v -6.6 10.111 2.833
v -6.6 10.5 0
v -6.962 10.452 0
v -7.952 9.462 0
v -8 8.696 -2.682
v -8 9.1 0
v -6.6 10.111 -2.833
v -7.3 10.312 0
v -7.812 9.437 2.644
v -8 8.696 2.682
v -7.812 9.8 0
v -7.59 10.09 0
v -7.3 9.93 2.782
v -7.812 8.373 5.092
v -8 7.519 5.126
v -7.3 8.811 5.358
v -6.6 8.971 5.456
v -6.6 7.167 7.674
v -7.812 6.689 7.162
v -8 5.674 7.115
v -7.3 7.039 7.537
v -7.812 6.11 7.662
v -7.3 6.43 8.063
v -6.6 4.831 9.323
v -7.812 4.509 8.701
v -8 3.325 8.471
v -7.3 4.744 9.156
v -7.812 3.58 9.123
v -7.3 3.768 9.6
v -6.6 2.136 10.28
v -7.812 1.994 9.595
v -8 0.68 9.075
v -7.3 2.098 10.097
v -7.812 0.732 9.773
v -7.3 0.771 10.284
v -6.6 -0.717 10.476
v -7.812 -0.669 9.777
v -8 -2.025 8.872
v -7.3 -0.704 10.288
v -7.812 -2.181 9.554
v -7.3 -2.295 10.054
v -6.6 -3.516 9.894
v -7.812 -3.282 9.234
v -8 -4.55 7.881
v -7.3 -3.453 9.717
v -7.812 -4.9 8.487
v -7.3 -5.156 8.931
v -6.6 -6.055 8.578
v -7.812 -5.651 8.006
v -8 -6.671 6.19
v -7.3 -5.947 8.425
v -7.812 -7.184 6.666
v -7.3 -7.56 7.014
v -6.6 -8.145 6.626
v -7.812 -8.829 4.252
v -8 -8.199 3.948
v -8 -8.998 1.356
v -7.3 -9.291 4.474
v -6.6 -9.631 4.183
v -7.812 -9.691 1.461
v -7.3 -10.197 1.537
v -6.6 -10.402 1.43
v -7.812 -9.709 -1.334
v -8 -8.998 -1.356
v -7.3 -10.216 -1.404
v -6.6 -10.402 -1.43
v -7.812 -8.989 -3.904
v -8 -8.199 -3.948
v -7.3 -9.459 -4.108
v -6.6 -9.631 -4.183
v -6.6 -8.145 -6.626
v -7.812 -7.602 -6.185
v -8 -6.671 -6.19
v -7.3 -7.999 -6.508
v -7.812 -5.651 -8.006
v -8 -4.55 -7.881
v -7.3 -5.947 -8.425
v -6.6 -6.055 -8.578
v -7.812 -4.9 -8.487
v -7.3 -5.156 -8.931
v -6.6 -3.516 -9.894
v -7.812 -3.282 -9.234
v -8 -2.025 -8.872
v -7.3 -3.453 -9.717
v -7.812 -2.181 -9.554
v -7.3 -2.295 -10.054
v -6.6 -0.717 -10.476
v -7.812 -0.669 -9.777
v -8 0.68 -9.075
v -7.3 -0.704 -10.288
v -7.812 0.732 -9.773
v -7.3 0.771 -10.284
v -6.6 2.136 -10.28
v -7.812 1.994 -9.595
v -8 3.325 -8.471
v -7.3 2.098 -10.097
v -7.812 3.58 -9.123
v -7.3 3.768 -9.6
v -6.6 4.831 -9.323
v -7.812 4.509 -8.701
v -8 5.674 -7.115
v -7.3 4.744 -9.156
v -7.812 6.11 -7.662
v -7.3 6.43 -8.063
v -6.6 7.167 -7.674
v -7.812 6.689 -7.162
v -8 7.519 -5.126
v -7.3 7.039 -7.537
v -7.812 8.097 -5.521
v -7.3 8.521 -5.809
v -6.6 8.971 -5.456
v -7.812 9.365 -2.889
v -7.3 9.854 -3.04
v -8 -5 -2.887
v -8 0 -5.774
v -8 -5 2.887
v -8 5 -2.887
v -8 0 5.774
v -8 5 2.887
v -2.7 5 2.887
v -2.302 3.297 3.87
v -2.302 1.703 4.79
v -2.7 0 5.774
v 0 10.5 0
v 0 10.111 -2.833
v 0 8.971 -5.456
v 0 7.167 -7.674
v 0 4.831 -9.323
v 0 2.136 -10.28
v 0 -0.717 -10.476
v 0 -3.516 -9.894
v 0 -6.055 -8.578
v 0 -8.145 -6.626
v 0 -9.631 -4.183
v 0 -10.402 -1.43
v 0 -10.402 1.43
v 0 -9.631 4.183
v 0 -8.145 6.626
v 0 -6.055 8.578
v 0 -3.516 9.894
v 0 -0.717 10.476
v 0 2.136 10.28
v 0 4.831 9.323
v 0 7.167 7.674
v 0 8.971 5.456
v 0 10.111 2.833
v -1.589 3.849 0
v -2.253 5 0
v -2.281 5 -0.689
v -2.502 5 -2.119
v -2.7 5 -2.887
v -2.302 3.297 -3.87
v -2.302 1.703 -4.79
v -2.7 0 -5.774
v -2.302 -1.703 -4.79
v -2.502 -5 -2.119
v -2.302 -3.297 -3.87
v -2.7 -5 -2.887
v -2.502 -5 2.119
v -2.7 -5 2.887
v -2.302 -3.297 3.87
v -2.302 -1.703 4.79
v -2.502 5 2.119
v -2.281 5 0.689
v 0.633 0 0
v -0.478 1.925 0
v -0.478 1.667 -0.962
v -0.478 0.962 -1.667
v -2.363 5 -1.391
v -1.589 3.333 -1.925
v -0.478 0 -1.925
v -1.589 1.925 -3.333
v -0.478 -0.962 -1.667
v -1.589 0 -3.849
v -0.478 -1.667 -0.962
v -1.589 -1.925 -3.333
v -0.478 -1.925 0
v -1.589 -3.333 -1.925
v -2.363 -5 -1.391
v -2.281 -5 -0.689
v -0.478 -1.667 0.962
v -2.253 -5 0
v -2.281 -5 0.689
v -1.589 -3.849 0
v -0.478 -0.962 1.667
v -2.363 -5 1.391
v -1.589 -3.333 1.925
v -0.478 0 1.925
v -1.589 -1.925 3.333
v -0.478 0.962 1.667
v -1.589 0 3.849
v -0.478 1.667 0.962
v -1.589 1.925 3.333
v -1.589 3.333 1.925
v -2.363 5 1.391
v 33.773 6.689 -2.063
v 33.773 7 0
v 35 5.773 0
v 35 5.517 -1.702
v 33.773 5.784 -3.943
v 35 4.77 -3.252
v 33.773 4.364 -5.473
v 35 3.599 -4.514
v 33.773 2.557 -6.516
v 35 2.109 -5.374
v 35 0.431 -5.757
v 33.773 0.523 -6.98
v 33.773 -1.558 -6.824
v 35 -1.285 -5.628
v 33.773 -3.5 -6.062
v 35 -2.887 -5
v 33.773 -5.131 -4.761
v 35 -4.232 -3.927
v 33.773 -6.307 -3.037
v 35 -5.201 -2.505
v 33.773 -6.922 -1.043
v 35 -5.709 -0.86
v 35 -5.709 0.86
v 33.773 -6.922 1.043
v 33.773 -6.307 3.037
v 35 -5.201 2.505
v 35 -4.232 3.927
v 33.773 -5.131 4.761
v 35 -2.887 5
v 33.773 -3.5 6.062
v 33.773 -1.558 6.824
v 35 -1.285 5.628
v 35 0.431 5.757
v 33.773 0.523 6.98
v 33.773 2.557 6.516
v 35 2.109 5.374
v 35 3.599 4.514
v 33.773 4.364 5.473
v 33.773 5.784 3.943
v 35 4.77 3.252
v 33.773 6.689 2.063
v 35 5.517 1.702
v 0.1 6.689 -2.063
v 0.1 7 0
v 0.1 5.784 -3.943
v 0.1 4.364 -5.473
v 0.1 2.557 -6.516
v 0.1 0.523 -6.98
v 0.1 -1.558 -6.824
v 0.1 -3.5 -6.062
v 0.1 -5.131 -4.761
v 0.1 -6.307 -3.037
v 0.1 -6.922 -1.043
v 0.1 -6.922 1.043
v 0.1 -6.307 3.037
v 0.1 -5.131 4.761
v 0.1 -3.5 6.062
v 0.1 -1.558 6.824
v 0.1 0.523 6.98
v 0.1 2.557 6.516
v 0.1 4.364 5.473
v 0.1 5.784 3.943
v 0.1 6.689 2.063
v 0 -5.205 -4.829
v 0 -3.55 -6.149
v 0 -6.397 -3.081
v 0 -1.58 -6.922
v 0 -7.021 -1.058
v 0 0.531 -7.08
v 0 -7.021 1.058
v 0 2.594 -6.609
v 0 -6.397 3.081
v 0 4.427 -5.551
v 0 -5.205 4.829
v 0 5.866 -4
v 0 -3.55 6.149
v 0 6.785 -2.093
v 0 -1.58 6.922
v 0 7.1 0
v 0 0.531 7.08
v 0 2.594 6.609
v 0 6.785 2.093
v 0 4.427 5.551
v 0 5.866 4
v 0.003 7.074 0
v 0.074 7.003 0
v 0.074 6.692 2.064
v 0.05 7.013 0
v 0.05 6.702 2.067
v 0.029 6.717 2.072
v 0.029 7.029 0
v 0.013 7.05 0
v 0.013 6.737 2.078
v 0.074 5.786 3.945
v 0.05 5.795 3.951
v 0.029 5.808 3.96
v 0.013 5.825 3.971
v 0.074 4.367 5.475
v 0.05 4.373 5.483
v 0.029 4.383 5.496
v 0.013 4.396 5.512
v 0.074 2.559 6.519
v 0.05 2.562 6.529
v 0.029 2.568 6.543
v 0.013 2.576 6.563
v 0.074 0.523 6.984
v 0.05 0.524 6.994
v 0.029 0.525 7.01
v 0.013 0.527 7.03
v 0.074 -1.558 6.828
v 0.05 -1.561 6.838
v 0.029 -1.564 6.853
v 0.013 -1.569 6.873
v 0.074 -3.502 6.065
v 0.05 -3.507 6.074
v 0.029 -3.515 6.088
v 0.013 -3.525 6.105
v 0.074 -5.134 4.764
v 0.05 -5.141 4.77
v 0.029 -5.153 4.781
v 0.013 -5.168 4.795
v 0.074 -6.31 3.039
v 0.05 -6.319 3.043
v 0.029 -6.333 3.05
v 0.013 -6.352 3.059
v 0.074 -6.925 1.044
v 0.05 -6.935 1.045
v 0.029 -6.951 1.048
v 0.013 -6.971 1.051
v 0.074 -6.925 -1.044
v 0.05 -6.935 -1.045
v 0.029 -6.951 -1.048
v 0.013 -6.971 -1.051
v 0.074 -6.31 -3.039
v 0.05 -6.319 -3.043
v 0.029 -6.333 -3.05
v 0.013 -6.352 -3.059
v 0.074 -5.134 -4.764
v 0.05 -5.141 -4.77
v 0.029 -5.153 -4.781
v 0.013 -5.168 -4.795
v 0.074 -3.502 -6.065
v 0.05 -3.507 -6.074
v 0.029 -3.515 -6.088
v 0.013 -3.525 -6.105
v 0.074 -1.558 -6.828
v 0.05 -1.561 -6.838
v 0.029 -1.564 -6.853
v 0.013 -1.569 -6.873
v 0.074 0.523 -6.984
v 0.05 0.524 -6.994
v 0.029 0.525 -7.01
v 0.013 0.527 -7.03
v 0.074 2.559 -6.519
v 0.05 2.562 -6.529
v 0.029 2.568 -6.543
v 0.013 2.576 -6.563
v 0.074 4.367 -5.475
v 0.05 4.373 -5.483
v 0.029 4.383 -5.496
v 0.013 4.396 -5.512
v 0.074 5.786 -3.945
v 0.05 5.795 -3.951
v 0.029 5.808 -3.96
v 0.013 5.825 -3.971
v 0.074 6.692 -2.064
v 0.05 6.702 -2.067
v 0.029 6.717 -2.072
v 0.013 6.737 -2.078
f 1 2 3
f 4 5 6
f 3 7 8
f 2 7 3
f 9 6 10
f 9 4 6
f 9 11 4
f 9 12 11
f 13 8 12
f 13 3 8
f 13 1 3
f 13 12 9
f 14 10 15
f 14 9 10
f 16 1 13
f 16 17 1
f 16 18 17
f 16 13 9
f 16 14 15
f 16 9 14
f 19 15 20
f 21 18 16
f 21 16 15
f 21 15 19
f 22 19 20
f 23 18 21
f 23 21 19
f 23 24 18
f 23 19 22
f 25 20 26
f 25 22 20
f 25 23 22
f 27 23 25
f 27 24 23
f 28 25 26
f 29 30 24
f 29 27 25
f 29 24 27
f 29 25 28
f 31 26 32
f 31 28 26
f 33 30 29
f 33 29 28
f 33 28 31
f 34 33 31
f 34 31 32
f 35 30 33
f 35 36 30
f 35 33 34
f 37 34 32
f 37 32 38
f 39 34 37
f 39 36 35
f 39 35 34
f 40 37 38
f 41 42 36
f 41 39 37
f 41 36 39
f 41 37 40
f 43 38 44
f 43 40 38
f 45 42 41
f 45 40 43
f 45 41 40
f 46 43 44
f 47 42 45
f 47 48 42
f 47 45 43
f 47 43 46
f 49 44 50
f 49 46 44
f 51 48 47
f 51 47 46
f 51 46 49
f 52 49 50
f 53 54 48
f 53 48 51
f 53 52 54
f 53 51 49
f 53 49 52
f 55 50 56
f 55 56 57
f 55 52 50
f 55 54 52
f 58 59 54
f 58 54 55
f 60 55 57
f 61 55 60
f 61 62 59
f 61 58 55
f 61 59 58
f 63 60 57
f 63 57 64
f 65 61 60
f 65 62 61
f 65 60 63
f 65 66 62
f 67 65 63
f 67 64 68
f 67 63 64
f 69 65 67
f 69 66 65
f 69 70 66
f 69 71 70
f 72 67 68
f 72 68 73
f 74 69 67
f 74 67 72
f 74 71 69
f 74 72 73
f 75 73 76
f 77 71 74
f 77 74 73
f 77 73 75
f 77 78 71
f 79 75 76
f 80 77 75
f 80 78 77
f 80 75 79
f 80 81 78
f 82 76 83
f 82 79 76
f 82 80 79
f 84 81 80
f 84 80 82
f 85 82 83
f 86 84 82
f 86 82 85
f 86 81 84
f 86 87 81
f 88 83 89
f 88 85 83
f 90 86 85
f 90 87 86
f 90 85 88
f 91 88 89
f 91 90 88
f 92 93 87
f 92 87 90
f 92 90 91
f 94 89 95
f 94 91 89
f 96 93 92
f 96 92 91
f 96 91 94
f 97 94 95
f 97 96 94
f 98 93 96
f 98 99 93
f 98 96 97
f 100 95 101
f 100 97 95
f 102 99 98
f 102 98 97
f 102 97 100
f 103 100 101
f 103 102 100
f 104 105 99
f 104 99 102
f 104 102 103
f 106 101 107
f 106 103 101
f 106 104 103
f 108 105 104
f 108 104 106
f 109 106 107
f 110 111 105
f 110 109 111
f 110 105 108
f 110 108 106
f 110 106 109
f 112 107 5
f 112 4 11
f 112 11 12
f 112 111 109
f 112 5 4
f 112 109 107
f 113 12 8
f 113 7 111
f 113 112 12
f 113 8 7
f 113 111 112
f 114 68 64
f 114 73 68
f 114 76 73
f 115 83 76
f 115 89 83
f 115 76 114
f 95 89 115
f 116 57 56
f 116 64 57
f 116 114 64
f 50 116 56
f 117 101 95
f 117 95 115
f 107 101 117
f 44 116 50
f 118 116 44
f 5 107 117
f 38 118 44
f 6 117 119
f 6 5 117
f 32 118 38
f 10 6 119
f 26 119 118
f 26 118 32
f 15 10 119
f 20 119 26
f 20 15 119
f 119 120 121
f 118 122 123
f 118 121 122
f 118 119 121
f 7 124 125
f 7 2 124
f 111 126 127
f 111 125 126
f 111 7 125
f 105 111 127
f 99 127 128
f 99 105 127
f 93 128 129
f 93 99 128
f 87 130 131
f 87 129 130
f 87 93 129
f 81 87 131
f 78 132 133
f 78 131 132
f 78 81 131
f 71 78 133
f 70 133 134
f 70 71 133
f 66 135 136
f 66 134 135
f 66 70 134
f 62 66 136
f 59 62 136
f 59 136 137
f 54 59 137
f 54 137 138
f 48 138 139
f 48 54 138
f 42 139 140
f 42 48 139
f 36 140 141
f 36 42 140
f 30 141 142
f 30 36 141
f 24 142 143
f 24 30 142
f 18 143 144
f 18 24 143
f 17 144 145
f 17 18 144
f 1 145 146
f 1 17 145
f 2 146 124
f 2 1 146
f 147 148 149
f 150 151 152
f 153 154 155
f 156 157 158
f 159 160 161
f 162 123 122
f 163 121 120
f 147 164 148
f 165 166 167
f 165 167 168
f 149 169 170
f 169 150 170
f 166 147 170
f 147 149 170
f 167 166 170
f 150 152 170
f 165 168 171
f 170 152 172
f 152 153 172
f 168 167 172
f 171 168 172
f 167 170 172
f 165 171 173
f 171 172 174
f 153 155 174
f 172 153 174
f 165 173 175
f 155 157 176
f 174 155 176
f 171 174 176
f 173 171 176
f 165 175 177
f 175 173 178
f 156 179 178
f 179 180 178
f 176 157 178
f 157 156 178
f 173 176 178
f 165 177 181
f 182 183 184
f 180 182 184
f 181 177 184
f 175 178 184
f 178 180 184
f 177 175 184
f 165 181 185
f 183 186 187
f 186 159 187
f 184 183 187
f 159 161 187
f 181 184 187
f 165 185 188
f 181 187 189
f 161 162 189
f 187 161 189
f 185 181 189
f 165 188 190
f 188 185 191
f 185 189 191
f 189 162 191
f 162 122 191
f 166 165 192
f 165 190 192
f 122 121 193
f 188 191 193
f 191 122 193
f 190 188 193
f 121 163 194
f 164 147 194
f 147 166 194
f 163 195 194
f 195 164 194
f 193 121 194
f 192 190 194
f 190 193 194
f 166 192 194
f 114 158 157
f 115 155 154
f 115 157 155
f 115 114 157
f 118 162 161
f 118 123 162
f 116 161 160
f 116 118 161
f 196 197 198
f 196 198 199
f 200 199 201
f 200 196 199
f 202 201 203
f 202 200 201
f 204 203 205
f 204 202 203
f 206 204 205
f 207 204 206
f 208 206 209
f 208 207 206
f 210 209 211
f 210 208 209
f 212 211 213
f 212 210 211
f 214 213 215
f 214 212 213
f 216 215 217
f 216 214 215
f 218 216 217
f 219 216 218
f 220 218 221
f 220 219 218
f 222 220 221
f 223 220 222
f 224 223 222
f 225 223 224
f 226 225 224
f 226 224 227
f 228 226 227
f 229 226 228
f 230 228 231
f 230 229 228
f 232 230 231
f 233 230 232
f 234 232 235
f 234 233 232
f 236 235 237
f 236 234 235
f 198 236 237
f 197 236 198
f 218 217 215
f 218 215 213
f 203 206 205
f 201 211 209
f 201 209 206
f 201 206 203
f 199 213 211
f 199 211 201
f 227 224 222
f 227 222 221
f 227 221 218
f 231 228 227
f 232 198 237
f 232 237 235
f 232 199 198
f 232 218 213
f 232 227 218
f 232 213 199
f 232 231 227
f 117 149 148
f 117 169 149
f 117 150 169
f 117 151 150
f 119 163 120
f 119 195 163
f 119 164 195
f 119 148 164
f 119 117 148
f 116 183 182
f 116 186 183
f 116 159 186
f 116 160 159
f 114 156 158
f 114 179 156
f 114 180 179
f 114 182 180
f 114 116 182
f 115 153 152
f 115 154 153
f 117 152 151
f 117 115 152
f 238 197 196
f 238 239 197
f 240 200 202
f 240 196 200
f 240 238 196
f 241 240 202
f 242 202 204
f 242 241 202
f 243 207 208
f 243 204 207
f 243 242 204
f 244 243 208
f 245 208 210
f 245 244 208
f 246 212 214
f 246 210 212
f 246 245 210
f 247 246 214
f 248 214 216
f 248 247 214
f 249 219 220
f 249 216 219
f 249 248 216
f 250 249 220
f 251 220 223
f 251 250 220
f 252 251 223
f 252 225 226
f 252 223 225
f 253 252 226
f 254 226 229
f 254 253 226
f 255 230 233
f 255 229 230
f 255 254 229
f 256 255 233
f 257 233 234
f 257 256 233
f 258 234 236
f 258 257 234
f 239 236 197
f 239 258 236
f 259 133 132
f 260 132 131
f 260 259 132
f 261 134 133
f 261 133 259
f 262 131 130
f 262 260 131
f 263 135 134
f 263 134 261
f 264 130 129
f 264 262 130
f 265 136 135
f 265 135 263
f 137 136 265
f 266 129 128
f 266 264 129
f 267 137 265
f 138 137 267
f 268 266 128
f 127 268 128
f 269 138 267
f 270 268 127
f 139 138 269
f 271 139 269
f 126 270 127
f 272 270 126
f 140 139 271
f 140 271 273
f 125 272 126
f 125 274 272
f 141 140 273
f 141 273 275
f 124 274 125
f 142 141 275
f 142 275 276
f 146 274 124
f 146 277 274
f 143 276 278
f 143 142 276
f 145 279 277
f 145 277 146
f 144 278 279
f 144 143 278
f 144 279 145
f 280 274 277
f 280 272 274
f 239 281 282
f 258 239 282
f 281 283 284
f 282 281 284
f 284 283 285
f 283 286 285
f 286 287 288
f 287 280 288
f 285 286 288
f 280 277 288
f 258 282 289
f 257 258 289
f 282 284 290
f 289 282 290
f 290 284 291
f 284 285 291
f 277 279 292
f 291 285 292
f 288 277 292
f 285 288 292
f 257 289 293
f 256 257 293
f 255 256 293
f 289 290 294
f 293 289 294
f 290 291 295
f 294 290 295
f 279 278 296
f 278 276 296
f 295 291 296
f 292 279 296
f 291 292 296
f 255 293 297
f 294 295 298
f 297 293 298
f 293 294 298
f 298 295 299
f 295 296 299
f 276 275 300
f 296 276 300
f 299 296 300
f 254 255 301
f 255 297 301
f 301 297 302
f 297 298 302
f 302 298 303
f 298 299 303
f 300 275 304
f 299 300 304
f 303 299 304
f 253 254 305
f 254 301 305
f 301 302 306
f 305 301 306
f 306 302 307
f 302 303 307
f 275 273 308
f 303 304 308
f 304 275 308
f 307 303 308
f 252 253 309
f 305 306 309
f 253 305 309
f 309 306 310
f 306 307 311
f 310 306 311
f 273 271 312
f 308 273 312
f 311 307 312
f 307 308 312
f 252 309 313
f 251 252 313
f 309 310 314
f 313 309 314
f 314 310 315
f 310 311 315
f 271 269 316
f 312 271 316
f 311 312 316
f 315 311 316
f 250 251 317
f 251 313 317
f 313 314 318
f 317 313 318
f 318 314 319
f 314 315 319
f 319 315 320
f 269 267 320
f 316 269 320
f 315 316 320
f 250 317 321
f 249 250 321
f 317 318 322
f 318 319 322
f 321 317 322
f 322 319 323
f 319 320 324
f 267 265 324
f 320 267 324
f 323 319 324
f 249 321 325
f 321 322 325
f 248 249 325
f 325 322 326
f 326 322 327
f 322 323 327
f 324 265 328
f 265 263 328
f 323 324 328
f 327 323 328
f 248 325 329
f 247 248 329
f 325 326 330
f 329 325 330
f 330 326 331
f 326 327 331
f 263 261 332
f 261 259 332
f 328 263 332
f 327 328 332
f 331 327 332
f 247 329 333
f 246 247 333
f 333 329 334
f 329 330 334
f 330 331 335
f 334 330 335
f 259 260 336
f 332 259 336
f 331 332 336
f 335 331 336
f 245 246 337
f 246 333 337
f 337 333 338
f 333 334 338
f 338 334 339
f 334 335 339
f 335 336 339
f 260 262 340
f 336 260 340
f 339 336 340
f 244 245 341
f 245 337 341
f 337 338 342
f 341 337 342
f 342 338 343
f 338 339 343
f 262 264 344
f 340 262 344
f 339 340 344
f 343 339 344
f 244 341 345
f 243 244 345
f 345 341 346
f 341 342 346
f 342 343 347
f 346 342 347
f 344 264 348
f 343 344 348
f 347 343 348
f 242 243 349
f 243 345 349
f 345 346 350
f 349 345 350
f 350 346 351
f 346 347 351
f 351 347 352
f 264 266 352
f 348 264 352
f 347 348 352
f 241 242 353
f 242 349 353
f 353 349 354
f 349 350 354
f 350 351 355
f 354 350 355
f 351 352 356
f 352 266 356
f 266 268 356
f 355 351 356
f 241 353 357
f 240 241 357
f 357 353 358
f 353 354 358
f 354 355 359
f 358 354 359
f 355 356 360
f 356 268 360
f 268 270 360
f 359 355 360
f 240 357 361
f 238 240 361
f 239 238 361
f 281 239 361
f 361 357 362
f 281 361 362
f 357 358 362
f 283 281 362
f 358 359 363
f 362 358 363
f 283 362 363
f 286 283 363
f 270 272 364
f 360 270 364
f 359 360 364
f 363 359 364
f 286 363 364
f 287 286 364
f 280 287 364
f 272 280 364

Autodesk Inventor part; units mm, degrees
ref_plane "YZ Plane" through (0, 0, 0) normal (1, 0, 0) x (0, 1, 0)
ref_plane "XZ Plane" through (0, 0, 0) normal (0, 1, 0) x (-1, 0, 0)
sketch "Sketch1" plane through (0, 0, 0) normal (0, 0, 1) x (1, 0, 0)
  line L0 (0.6333, 0) -> (35, 0)
  line L1 (35, 0) -> (35, 7)
  line L2 (35, 7) -> (6, 7)
  line L3 (6, 7) -> (4.773, 7)
  line L4 (4.773, 7) -> (0, 7)
  line L5 (0, 7) -> (0, 10.5)
  line L6 (0, 10.5) -> (-8, 10.5)
  line L7 (-8, 10.5) -> (-8, 5.7735)
  line L8 (-8, 5.7735) -> (-2.7, 5.7735)
  line L9 (-2.7, 5.7735) -> (0.6333, 0)
  line L10 (-16.6, 0) -> (43.6, 0) projected
  line L11 (0, -2.1) -> (0, 12.6) projected
  line L12 (6, 7) -> (0, 7) construction
  dimension "d1" = 29
  dimension "d2" = 1.227
  dimension "d3" = 8
  dimension "d4" = 5.3
  dimension "d5" = 60
  dimension "d6" = 14
  dimension "d7" = 14
  dimension "d8" = 11.547
  dimension "d9" = 21
  dimension "d26" = 35
revolve "Body" add sketch "Sketch1" angle 360 about axis through (0.6333, 0, 0) along (1, 0, 0) contours L9 L11 L4 L3 L2 L1 L0 | L9 L8 L7 L6 L5 L11
sketch "Sketch2" plane through (-8, 0, 0) normal (-1, 0, 0) x (0, 0, 1)
  circle A0 centre (0, 0) radius 5.7735 projected
  line L0 (0, -14.7) -> (0, 14.7) projected
  line L1 (-14.7, 0) -> (14.7, 0) projected
  line L2 (5.7735, 0) -> (2.8868, -5)
  line L3 (2.8868, -5) -> (-2.8868, -5)
  line L4 (-2.8868, -5) -> (-5.7735, 0)
  line L5 (-5.7735, 0) -> (-2.8868, 5)
  line L6 (-2.8868, 5) -> (2.8868, 5)
  line L7 (2.8868, 5) -> (5.7735, 0)
extrude "Slot" add sketch "Sketch2" against normal up to next contours L7 A0 | A0 L2 | L6 L0 A0 | A0 L0 L3 | L0 L6 A0 | A0 L3 L0 | L4 A0 | A0 L5
fillet "Fillet1" radius 1.4 1 edges at (-8, -10.5, 0)
thread "Thread" size "M14x2" class "6g" standard "ISO Metric profile" length 29
chamfer "Chamfer1" distance 1.2269 distance2 1.2269 1 edges at (35, -7, 0) measured on face at (35, -0.3293, 1.9203)
ref_plane "Work Plane1" through (29, 0, 0) normal (0, -1, 0) x (1, 0, 0)
fillet "Fillet2" radius 0.1 1 edges at (0, -7, 0)
equation "\"d1\" = GEL"
equation "\"d3\" = KOH"
equation "\"d4\" = INTI"
equation "\"d6\" = GD"
equation "\"d7\" = BDM"
equation "\"d8\" = 1.1547 * SW"
equation "\"d9\" = KOD"
equation "\"d26\" = NLG"
equation "\"d30\" = R"
equation "\"d17\" = RR"
equation "\"d13\" = GEL"
equation "\"d15\" = -0.5 * SPD + 0.5 * GD"
equation "\"d16\" = GUL"
equation "\"GD\" = NND"
equation "\"NLG\" = 35"
equation "\"GEL\" = 29"
equation "\"KOD\" = 21"
equation "\"KOH\" = 8"
equation "\"INTI\" = 5.3"
equation "\"GAL\" = 0.61345 * PTC"
equation "\"GUL\" = 0.61345 * PTC"
equation "\"BDM\" = NND"
equation "\"RR\" = 1.4"
equation "\"SPD\" = NND - 1.2269 * PTC"
equation "\"R\" = 0.1"
equation "\"TOA\" = 30deg"
equation "\"GD1\" = THREADDIA - 1.2269 * PTC"
equation "\"THREADDIA\" = 14"
equation "\"FAWI\" = 45deg"
equation "\"ANG\" = 120deg"
equation "\"PTC\" = 2"
equation "\"NND\" = 14"
equation "\"E0\" = 1.155 * SW"
equation "\"SW\" = 10"
properties part number "DIN 7984 - M14 x 35" material "Steel, Mild"
